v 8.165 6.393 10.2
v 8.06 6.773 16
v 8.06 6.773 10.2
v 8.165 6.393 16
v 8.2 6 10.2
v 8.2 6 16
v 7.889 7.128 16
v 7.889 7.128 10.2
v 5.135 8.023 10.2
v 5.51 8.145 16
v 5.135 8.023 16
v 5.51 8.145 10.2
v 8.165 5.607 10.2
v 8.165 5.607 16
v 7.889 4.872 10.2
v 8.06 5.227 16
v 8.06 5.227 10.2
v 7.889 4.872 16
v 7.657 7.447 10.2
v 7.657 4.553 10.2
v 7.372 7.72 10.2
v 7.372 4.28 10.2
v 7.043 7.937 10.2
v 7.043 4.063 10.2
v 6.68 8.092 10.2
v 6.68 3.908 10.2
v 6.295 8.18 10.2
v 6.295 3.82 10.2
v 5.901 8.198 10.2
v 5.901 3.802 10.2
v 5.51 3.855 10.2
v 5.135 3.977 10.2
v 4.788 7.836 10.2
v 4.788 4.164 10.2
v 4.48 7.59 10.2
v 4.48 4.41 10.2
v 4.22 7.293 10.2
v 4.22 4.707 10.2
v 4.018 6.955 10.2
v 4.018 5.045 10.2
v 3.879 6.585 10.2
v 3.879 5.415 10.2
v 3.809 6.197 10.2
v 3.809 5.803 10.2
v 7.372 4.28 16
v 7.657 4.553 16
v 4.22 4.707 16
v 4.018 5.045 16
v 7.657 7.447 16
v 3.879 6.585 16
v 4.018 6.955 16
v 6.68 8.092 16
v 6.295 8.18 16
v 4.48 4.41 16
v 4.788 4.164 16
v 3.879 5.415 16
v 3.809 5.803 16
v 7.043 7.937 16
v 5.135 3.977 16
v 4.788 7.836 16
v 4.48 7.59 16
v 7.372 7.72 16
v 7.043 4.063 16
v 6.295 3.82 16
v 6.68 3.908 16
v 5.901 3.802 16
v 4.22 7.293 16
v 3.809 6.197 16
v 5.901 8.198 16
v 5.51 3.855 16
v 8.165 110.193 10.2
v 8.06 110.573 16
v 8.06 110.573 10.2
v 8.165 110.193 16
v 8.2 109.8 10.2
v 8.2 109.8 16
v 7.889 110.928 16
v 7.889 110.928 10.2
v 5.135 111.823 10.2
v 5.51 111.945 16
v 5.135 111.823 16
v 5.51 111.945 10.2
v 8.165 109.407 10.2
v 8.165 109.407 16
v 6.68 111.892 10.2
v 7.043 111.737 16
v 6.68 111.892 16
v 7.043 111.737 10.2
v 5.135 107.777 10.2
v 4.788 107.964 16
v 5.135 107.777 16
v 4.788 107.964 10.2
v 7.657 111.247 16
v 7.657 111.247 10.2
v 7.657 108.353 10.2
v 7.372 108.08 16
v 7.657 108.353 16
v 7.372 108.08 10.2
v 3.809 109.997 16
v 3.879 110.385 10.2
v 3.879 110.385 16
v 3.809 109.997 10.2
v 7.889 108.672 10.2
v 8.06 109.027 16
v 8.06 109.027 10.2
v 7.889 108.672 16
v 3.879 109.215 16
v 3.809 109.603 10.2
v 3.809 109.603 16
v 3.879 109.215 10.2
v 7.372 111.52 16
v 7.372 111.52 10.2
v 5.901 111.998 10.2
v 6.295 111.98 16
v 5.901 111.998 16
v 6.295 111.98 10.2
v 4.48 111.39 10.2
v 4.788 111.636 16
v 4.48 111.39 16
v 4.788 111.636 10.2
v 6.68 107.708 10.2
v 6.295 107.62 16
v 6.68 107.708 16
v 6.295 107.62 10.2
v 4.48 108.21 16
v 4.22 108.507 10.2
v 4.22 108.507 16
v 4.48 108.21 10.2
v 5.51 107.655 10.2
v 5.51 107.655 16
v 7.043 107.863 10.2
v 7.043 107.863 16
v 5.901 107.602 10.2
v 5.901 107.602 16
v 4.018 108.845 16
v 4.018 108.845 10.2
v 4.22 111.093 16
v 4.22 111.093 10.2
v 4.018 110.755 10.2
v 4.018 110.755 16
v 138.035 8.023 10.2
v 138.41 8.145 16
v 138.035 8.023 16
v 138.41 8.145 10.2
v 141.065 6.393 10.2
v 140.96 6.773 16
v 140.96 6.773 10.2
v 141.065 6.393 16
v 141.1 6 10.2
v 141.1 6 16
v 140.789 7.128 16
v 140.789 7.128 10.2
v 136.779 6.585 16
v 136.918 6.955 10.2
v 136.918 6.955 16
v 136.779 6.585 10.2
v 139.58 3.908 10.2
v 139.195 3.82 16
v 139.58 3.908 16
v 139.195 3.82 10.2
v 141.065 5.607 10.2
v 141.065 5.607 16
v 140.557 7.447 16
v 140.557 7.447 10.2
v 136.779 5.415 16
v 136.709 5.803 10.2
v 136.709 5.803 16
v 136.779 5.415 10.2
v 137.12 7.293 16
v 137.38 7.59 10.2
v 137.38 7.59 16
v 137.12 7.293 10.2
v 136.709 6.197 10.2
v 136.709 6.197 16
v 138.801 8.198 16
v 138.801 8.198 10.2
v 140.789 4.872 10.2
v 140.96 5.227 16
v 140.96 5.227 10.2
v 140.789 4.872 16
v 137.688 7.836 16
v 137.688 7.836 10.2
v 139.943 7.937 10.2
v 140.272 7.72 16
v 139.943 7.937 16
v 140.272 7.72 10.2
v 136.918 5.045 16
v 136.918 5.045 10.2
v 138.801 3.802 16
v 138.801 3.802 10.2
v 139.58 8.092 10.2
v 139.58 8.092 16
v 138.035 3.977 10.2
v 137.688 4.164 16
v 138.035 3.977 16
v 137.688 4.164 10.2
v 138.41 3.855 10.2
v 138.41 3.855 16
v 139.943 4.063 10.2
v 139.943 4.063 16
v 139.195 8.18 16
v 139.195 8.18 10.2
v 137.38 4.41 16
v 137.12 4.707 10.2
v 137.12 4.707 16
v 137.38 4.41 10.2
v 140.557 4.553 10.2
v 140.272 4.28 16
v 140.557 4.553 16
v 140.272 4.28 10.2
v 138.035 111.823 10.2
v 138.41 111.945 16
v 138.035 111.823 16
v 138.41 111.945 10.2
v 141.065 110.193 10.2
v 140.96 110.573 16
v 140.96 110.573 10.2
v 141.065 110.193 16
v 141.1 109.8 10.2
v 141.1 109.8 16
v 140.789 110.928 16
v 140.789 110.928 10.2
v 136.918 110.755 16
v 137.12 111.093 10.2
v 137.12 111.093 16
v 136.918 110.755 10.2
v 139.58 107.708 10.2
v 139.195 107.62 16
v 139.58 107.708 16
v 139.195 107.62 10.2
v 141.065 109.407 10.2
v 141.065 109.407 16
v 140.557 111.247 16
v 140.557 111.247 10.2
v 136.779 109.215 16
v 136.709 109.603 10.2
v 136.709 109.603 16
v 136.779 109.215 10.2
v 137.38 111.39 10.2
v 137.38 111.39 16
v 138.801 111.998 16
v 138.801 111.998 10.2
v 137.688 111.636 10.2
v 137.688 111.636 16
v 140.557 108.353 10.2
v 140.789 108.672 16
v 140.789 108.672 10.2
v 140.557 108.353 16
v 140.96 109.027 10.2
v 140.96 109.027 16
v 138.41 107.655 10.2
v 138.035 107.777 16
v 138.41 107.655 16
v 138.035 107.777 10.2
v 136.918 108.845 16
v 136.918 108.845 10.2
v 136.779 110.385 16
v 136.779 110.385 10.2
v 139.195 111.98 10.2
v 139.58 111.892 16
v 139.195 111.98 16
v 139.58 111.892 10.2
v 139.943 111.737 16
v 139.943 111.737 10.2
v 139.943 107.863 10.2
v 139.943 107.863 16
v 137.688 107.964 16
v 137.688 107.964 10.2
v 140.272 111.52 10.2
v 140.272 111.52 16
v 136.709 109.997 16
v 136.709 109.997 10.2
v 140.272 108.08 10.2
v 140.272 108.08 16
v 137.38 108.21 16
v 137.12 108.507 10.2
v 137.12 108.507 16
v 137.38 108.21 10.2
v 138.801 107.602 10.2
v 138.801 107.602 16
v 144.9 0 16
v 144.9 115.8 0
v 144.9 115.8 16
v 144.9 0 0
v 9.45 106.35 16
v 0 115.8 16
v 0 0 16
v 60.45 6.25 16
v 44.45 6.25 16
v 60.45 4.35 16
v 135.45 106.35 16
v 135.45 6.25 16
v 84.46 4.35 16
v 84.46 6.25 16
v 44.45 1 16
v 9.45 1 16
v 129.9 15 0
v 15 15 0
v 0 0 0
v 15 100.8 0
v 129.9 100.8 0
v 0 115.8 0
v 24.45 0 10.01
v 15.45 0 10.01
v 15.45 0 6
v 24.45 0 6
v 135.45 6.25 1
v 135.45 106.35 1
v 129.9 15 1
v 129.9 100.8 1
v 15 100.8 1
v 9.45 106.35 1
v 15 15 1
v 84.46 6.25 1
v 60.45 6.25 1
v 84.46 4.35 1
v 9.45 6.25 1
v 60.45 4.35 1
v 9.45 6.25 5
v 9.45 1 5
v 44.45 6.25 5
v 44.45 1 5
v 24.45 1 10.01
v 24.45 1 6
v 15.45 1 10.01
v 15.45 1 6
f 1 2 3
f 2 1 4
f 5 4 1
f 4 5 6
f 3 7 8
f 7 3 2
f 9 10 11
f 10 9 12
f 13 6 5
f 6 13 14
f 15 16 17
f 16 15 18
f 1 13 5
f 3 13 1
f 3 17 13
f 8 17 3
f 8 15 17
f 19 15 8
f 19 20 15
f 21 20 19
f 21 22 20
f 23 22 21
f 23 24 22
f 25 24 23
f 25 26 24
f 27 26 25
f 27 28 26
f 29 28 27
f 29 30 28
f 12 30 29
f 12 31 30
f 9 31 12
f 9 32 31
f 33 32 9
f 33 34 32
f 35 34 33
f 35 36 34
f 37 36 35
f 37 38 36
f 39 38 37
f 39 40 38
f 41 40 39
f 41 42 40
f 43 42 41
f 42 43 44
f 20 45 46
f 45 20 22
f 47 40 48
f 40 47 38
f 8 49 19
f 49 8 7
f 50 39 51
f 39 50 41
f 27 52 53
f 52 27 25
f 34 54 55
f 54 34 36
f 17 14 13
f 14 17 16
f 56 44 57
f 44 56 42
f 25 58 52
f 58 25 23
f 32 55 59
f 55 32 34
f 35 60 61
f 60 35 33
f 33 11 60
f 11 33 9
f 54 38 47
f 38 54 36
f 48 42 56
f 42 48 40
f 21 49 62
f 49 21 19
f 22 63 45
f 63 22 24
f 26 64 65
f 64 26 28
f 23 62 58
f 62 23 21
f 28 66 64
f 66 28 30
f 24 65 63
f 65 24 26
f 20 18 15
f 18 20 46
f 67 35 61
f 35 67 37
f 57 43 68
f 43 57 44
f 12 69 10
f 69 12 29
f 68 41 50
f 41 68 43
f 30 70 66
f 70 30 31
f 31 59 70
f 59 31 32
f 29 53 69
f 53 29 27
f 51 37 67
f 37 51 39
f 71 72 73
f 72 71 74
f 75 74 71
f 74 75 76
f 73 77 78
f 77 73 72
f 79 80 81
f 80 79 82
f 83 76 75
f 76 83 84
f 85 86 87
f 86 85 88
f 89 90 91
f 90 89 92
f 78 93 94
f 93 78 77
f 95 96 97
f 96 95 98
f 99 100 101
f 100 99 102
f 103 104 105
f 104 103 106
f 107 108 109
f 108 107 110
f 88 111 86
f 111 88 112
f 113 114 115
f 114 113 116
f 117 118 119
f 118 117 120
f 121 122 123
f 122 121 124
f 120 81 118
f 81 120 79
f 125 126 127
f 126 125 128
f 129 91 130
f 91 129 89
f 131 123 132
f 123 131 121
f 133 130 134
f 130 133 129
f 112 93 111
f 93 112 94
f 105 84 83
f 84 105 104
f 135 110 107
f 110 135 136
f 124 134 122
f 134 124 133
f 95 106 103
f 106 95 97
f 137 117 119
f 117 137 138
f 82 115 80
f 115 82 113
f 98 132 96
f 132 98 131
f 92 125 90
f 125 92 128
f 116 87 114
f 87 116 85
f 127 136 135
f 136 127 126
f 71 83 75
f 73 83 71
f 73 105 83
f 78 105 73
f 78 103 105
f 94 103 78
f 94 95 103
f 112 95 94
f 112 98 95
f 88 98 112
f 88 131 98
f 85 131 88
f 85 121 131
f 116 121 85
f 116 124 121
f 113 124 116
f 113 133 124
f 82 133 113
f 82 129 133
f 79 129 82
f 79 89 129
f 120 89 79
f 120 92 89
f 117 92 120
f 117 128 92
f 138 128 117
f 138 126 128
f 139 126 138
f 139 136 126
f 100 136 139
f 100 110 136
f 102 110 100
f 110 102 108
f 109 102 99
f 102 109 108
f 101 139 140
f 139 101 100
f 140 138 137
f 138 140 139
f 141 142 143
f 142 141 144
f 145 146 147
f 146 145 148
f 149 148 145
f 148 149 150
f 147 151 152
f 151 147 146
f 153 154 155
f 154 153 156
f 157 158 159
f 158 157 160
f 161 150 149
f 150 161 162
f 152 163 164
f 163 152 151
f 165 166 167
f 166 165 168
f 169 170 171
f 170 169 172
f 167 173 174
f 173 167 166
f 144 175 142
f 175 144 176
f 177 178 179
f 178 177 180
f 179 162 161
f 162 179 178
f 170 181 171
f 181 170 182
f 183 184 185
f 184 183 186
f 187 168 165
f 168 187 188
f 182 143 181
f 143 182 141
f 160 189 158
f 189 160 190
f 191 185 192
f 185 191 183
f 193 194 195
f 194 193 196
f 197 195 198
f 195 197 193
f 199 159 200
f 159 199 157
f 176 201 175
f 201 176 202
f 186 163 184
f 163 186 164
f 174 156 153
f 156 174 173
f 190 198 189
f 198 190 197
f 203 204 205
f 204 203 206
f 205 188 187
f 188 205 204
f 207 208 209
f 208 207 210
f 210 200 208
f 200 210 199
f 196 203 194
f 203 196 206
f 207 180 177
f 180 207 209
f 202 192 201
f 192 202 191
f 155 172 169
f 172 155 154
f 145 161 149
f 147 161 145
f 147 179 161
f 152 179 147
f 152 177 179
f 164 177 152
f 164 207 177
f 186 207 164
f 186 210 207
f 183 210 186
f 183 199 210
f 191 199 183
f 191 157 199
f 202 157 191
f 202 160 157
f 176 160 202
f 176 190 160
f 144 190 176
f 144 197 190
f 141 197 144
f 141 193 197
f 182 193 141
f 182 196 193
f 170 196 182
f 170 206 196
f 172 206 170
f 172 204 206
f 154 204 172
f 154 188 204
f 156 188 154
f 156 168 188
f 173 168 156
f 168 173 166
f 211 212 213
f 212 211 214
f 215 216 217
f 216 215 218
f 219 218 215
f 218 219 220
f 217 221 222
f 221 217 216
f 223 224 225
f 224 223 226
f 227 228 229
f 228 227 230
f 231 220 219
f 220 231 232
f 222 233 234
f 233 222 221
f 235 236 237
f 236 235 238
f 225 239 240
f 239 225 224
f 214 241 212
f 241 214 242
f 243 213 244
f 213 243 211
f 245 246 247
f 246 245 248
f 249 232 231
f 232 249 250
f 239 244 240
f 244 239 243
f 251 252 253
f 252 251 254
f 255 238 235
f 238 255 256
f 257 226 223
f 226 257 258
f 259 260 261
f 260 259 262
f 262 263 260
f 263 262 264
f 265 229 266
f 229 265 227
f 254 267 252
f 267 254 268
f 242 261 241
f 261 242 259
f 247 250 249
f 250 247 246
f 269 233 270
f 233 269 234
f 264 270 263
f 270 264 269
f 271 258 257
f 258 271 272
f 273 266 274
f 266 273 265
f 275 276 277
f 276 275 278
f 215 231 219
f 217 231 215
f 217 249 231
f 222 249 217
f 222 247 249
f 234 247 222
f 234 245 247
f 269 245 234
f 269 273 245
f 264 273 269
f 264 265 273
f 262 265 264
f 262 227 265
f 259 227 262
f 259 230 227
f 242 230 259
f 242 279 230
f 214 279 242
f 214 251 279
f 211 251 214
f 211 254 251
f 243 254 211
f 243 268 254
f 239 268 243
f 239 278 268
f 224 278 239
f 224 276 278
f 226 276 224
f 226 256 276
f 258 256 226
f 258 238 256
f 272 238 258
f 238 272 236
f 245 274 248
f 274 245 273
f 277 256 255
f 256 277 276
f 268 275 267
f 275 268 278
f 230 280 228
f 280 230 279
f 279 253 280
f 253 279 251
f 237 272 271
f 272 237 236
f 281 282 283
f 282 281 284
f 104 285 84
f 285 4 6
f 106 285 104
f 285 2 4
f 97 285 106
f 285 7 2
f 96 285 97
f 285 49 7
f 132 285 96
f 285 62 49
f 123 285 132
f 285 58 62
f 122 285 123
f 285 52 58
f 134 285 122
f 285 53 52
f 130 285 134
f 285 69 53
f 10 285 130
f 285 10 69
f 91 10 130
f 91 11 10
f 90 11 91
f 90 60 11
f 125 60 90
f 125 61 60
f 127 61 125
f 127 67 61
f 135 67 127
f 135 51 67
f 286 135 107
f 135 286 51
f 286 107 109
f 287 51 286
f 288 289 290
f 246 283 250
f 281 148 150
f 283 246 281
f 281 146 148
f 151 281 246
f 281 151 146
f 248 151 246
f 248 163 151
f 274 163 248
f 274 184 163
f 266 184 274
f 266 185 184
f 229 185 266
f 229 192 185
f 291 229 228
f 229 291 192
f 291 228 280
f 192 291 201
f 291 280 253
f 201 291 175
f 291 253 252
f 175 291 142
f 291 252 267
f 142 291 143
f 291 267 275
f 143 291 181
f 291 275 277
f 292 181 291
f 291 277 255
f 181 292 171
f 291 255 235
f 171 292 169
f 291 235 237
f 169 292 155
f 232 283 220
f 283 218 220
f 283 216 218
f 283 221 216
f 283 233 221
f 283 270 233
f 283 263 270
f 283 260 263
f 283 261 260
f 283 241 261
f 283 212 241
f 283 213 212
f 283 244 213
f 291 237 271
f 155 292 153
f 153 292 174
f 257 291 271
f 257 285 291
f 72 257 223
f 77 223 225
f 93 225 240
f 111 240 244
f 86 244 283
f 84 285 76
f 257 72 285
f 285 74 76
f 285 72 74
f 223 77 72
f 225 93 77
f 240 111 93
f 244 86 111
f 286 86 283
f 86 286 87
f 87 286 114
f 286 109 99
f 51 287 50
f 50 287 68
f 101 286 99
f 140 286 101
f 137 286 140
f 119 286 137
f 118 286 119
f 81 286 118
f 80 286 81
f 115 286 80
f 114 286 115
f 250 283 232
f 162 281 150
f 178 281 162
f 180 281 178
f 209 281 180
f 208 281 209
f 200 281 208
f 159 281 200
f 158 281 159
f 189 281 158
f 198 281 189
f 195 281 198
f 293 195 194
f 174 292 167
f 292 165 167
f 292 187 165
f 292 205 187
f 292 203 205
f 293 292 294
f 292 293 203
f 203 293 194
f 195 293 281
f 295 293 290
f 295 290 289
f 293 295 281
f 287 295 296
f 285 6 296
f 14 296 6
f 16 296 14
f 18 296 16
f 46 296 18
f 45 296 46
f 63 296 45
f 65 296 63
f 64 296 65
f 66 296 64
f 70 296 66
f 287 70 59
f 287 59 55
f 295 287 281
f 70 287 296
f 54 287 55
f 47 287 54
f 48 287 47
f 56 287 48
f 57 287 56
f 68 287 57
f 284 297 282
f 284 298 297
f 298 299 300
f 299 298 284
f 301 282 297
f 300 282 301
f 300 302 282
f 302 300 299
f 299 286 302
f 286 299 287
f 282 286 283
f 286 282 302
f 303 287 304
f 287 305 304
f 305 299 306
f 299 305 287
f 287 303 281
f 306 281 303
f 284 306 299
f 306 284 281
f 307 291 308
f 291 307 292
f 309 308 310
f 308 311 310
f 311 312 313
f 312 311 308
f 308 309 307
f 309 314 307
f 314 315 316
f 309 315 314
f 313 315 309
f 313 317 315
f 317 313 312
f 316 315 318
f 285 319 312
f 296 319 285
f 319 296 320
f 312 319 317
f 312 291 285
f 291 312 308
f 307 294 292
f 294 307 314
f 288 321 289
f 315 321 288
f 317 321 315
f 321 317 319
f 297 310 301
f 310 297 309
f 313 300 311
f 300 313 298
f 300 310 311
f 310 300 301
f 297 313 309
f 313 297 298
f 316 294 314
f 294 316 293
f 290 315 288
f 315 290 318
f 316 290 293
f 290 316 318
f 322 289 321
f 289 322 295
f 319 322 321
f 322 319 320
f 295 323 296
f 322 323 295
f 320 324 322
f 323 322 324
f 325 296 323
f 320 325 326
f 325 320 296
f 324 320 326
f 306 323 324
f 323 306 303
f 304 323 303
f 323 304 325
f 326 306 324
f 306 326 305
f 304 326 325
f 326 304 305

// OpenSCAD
$fa = 1;
$fs = 0.4;

/*
  Public variables:
*/
// 5.65inch epd
epdOutline = [125.4, 99.5];
epdDsiplay = [114.9, 85.8];

// 7.5inch epd 
// epdOutline = [170.2, 111.2];
// epdDsiplay = [163.2, 97.92];

frameWidth = 15;

/*
  Private variables:
*/
epdSpace = 0.6;
epd = [epdOutline.x + epdSpace, epdOutline.y + epdSpace, 1];
depth = 16;
exterior = [epdDsiplay.x + frameWidth * 2, epdDsiplay.y + frameWidth * 2, depth];
epsilon = 0.01;
screwRadius = 2.2;


module frameFront() {
  notch = [24, 1.9, depth - 1];
  portNotch = [35,10, 11];
  portHole = [9, 1, 4];
  difference() {
    cube([exterior.x, exterior.y, exterior.z],center=false);

    offsetX = frameWidth - (epd.x - epdDsiplay.x)/2;
    offsetY = exterior.y - offsetX - epd.y;
    translate([offsetX, offsetY, 1]) cube([epd.x, epd.y, depth],center=false);

    translate([frameWidth,frameWidth,-epsilon]) cube([epdDsiplay.x, epdDsiplay.y, 2],center=false);

    translate([(exterior.x / 2) - (notch.x/2),offsetY - notch.y,1]) cube([notch.x+epsilon, notch.y+epsilon, notch.z+epsilon],center=false);

    translate([offsetX,1,depth-portNotch.z]) cube([portNotch.x, portNotch.y+epsilon, portNotch.z+epsilon],center=false);

    translate([offsetX + 6,0-epsilon,depth-portNotch.z+1]) cube([portHole.x, portHole.y+epsilon*2, portHole.z+epsilon],center=false);

    // screw holes
    screwHolePositions = [
      [6,6],
      [6,exterior.y-6],
      [exterior.x-6,6],
      [exterior.x-6,exterior.y-6]
    ];
    for ( i = [0 : 3] ) {
      translate([screwHolePositions[i].x, screwHolePositions[i].y, depth-5.8])
        cylinder(h=5.8+epsilon,r=screwRadius,center=false); 
    }
  }
}

module frameBack() {}

module frameInner() {}

module main() {
  frameFront();
}

main();
